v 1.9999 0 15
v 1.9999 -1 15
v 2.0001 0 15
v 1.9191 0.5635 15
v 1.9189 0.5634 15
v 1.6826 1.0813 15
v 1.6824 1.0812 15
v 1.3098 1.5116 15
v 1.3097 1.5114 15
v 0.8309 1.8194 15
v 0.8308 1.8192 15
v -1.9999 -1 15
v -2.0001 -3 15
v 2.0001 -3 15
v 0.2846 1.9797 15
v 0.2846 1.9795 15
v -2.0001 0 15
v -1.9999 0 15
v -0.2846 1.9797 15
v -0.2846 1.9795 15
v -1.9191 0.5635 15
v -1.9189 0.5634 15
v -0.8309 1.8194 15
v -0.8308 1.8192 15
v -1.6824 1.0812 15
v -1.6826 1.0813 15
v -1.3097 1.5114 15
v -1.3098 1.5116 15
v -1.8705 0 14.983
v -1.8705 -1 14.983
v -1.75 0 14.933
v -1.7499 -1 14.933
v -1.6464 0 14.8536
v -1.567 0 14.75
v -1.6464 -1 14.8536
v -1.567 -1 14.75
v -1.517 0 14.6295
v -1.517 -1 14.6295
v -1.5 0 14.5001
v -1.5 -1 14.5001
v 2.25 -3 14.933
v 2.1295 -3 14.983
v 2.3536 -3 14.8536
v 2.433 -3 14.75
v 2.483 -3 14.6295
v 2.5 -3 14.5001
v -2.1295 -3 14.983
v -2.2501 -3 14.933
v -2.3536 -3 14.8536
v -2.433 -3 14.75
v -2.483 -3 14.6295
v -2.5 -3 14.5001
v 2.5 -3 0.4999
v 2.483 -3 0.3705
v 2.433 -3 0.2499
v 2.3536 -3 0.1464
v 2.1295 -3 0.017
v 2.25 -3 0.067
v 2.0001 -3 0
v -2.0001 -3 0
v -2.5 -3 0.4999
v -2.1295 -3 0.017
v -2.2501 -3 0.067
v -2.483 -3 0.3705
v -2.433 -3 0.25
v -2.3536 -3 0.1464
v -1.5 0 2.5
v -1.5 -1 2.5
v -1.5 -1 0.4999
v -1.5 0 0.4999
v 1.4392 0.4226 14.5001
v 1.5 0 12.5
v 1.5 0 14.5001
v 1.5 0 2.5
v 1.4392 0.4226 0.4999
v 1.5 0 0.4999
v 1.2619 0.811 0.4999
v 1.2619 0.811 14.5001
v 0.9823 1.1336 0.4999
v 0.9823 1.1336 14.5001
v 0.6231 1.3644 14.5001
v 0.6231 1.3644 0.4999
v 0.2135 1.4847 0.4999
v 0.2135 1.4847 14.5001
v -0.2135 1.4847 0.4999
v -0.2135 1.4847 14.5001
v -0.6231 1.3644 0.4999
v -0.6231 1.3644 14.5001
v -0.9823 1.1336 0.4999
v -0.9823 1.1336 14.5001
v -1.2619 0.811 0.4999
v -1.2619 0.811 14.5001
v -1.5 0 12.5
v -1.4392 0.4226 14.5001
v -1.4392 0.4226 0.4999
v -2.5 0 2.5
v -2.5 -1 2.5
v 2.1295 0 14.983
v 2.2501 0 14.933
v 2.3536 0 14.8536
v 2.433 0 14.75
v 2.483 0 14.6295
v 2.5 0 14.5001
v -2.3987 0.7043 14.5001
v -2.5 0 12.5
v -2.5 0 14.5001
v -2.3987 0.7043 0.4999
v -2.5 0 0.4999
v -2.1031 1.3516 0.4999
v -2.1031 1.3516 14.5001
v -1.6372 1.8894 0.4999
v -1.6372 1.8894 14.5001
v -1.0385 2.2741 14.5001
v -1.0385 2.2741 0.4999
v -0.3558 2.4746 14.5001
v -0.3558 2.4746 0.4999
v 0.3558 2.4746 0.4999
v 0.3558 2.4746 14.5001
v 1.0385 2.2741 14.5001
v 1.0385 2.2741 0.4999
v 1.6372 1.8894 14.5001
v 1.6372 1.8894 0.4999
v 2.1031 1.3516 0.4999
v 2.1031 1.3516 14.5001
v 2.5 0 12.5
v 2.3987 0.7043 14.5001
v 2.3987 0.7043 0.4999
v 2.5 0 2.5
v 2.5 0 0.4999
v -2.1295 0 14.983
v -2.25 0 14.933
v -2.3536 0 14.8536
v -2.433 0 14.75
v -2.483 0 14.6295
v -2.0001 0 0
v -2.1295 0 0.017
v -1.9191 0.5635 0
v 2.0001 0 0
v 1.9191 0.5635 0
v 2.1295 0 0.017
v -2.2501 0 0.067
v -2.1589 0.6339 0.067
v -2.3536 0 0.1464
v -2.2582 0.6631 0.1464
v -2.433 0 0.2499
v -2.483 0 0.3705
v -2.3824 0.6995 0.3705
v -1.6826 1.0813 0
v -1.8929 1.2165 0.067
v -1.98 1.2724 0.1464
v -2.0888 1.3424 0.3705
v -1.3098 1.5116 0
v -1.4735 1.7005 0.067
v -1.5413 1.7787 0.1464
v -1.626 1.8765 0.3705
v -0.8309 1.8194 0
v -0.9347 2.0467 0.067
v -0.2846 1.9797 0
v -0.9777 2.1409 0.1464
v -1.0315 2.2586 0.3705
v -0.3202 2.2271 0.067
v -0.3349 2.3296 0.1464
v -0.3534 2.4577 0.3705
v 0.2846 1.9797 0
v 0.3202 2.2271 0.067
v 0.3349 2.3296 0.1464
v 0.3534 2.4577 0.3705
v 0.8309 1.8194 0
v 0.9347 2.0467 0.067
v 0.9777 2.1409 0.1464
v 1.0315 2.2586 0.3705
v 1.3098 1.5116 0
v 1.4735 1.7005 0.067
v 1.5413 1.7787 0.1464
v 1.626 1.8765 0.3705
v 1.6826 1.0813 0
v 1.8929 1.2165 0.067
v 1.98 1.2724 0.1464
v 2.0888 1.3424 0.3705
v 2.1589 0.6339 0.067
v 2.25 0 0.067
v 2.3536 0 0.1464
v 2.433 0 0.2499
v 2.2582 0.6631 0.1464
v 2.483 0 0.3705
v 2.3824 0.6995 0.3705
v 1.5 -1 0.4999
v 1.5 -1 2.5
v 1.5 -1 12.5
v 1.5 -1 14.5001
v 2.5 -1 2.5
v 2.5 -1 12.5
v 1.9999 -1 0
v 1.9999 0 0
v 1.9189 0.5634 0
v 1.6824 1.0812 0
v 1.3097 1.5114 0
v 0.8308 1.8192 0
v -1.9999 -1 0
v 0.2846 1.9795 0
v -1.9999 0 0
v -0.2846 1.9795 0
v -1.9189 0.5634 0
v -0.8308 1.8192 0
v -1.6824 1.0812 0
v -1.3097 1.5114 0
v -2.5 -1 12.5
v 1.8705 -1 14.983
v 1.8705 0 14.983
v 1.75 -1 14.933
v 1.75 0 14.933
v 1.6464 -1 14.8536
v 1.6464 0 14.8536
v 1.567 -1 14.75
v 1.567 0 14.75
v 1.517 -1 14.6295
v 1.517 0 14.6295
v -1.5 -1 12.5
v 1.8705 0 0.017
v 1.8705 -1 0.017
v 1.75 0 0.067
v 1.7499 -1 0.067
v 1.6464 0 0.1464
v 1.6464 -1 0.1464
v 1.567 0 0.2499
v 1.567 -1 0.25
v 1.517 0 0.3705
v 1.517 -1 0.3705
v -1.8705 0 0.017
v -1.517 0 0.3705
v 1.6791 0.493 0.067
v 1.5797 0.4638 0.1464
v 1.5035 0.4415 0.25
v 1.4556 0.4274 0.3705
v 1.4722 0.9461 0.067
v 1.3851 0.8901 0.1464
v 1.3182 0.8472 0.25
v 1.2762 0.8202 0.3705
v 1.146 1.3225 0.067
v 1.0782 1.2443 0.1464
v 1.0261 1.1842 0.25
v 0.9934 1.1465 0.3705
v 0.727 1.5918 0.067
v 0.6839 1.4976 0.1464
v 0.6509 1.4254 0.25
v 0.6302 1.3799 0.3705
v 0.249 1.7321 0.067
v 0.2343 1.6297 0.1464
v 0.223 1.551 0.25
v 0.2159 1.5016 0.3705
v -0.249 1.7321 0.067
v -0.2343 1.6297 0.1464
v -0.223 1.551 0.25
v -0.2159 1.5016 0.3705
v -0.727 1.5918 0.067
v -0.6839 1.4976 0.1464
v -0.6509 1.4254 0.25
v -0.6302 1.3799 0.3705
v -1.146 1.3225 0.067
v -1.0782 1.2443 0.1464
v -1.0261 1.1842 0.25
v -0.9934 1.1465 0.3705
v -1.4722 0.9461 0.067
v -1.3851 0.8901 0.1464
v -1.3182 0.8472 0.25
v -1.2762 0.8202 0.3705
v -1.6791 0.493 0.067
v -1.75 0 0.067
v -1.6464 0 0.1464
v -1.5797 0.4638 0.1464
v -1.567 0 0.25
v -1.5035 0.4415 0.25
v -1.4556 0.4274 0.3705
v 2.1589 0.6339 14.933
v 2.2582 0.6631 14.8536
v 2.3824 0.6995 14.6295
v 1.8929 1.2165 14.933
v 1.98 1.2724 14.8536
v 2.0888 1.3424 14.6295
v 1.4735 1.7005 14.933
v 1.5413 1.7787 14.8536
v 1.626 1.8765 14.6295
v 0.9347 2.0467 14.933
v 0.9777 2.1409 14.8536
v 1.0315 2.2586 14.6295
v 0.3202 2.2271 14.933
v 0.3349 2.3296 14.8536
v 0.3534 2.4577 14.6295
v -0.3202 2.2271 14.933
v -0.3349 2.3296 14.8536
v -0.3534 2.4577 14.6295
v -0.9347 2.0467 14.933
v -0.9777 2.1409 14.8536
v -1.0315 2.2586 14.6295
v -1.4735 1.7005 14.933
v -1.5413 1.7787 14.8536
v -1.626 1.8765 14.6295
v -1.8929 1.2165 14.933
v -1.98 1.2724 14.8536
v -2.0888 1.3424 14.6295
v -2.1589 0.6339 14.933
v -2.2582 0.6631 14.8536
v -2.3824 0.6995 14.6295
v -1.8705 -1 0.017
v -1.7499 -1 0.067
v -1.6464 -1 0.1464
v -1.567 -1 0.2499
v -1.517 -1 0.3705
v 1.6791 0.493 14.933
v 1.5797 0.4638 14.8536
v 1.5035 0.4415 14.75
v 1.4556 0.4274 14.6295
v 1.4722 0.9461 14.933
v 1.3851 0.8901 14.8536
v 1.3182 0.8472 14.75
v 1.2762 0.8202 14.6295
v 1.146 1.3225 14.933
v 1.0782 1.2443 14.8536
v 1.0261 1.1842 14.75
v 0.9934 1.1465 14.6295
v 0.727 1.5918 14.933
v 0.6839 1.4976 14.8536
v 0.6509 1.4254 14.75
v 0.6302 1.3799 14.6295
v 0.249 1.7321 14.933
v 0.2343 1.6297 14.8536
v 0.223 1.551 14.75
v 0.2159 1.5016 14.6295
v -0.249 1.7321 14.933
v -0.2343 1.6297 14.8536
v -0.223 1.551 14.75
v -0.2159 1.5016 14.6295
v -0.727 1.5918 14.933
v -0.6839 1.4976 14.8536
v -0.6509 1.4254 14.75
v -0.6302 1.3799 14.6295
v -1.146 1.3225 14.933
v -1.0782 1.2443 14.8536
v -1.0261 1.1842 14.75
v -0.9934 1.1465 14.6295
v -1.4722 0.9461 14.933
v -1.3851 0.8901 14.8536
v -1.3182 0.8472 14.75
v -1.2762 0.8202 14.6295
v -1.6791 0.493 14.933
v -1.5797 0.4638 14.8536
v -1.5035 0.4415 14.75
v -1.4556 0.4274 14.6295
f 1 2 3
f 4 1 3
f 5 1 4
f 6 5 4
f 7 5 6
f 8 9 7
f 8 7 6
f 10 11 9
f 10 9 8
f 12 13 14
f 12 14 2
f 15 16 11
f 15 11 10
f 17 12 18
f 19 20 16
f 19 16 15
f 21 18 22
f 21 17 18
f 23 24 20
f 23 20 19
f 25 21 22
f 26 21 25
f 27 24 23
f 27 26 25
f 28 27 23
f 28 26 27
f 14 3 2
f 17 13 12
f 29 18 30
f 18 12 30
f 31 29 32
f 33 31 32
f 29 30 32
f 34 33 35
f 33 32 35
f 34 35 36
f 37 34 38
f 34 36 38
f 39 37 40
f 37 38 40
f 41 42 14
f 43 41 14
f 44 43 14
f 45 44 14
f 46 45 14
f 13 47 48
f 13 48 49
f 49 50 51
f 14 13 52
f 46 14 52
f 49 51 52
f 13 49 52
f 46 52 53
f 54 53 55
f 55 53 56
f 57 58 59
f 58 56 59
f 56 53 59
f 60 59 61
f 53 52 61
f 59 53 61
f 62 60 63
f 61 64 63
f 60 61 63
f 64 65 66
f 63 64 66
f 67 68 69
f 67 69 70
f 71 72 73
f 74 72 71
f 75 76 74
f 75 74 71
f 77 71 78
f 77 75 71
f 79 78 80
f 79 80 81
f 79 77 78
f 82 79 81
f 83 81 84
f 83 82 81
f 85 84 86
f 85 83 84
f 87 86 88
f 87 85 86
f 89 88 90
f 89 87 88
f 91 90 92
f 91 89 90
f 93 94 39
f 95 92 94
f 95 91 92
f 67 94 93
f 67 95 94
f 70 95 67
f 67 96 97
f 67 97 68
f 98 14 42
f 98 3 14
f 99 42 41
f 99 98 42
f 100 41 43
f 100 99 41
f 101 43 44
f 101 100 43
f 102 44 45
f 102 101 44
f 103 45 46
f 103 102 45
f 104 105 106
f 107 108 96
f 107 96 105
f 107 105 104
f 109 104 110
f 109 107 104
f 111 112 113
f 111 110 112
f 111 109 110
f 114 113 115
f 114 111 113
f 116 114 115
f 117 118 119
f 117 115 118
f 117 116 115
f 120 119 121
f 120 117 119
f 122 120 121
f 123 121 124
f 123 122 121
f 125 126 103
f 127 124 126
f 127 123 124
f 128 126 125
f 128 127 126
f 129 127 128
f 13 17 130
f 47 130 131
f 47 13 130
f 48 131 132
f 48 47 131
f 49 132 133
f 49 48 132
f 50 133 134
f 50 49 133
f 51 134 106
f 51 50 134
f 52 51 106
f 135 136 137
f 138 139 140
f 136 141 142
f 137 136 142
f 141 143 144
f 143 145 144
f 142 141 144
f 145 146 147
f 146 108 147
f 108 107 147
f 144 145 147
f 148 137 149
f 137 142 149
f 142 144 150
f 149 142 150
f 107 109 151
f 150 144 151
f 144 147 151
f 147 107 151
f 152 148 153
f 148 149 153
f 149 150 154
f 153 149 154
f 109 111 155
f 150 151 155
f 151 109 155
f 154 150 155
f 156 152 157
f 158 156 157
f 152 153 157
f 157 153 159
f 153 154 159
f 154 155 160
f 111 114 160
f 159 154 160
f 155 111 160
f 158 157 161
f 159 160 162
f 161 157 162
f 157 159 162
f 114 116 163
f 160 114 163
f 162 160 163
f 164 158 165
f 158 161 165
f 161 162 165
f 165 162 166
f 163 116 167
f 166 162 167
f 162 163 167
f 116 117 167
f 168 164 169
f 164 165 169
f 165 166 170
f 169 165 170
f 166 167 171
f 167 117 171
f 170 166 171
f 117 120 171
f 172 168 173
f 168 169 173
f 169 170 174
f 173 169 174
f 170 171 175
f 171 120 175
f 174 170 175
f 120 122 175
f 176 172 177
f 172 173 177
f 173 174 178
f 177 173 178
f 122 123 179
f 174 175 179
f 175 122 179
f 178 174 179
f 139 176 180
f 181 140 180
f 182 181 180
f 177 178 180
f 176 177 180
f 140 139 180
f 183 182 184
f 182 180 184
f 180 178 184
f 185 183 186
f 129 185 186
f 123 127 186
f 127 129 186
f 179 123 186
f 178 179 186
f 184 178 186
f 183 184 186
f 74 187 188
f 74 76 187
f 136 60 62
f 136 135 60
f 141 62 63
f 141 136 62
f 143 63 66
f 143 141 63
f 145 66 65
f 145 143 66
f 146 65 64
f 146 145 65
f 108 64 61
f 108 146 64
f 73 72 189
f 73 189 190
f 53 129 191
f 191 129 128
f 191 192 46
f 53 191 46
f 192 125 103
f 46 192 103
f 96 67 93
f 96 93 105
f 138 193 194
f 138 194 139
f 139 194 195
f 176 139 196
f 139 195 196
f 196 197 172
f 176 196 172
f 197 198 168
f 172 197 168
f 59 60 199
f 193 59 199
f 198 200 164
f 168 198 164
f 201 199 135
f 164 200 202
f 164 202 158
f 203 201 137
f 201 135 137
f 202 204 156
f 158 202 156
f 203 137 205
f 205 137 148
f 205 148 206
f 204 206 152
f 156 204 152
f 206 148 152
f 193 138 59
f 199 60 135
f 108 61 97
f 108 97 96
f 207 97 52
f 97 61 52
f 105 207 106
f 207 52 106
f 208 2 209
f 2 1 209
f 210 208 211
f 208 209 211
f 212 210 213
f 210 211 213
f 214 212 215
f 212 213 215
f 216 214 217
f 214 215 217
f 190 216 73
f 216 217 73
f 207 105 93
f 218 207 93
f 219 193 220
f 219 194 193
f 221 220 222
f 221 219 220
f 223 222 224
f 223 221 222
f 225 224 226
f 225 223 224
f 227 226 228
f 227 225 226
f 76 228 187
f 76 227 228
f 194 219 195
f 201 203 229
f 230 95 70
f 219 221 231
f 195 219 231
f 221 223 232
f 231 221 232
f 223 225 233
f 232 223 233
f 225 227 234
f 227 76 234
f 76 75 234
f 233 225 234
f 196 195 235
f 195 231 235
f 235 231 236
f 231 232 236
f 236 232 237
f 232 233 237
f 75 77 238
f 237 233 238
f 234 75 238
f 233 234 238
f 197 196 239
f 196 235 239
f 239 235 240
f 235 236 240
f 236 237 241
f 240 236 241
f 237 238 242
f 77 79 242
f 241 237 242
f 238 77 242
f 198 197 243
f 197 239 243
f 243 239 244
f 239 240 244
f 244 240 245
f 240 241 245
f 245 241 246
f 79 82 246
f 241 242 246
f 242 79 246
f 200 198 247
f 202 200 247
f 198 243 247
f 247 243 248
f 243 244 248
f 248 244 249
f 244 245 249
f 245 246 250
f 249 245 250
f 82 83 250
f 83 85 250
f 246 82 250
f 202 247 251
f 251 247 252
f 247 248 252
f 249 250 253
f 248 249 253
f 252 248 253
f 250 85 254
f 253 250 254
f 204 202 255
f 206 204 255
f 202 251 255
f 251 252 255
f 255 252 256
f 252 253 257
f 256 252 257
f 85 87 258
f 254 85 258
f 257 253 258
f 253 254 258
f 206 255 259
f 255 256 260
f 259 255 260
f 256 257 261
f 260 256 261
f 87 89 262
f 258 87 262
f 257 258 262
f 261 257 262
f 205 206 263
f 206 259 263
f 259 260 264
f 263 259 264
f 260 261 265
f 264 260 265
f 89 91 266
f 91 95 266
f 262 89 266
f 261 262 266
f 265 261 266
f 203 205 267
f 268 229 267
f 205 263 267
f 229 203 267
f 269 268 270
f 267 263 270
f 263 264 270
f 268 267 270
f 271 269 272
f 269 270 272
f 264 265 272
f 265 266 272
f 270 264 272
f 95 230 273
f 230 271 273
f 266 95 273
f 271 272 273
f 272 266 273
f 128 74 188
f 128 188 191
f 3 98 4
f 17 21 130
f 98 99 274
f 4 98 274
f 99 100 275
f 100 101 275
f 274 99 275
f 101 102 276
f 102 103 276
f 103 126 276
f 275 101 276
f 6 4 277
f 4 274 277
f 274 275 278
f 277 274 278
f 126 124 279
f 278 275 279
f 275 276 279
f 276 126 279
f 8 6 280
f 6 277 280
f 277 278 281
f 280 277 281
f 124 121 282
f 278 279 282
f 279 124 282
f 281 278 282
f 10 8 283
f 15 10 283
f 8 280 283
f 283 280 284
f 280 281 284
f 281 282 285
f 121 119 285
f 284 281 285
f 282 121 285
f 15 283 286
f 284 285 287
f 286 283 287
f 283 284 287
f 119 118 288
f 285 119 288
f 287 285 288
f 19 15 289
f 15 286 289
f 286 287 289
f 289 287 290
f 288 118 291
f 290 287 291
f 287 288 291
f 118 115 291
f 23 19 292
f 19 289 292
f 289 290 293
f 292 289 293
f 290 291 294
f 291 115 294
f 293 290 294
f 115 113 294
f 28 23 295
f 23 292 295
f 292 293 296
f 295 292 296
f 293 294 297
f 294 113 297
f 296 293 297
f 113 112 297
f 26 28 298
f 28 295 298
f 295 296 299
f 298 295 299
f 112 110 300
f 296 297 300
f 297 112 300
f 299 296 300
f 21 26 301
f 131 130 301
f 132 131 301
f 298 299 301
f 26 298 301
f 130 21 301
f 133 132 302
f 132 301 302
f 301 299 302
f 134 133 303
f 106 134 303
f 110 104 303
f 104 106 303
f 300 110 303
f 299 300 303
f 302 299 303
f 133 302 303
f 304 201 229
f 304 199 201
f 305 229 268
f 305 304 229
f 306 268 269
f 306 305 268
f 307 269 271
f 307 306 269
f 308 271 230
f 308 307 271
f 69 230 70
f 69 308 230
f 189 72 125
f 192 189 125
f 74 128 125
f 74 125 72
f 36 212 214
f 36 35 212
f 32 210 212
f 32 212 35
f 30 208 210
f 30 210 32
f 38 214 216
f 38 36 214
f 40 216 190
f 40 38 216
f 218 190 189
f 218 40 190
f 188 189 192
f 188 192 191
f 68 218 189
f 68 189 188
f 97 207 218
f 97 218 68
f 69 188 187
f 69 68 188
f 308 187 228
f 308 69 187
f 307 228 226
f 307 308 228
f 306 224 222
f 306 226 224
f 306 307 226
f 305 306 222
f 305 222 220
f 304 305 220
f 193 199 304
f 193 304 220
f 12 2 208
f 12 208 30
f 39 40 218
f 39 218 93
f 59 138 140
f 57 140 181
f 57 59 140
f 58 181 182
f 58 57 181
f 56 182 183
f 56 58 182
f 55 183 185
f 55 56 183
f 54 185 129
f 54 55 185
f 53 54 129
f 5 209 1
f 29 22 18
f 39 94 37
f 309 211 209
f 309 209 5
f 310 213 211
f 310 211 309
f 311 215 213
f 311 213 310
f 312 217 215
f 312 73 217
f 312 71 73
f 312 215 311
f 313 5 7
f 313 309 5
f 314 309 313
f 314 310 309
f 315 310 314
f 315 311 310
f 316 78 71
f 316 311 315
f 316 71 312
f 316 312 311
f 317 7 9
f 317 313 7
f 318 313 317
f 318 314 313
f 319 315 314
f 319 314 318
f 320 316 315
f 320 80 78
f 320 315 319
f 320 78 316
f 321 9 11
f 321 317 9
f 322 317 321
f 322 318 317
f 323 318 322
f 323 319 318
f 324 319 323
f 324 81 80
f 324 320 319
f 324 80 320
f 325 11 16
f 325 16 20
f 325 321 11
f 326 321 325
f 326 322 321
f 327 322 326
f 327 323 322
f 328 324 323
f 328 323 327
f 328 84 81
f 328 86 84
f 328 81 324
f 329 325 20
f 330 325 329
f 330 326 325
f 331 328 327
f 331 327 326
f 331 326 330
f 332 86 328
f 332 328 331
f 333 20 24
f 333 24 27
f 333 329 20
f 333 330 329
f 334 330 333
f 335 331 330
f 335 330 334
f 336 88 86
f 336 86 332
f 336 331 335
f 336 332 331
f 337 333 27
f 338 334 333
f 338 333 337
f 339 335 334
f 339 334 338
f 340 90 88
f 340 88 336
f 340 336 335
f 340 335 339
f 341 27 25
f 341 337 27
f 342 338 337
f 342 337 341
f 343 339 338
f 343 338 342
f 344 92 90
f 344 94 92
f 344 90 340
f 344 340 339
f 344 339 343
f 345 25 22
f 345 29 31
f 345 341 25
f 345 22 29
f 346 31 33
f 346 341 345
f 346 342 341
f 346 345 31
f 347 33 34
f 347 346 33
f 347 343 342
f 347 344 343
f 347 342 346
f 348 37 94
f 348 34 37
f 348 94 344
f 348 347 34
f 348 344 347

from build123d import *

# Parameters (mm, degrees)
DODANIE_WYCI_GNI_CIE2_DEPTH = 15
SZKIC3_W                    = 1
SZKIC3_H                    = 2.5
DODANIE_WYCI_GNI_CIE3_DEPTH = 3
SZKIC4_W                    = 1
SZKIC4_H                    = 2
DODANIE_WYCI_GNI_CIE4_DEPTH = 10
SZKIC6_W                    = 15
SZKIC6_H                    = 2
DODANIE_WYCI_GNI_CIE5_DEPTH = 3
ZAOKR_GLENIE1_R             = 0.5


with BuildPart() as part:
    # Szkic1 → Dodanie-wyciągnięcie2 (new body)
    with BuildSketch(Plane.XY):
        with BuildLine():
            ThreePointArc((-2.5, 0), (0, 2.5), (2.5, 0))
            Line((2.5, 0), (1.5, 0))
            ThreePointArc((1.5, 0), (0, 1.5), (-1.5, 0))
            Line((-1.5, 0), (-2.5, 0))
        make_face()
    extrude(amount=DODANIE_WYCI_GNI_CIE2_DEPTH)

    # Szkic3 → Dodanie-wyciągnięcie3 (add)
    with BuildSketch(Plane.XZ):
        with Locations((-2, 13.75)):
            Rectangle(SZKIC3_W, SZKIC3_H)
        with Locations((2, 13.75)):
            Rectangle(SZKIC3_W, SZKIC3_H)
        with Locations((2, 1.25)):
            Rectangle(SZKIC3_W, SZKIC3_H)
        with Locations((-2, 1.25)):
            Rectangle(SZKIC3_W, SZKIC3_H)
    extrude(amount=DODANIE_WYCI_GNI_CIE3_DEPTH)

    # Szkic4 → Dodanie-wyciągnięcie4 (add)
    with BuildSketch(Plane(origin=(0, 0, 12.5), x_dir=(-1, 0, 0), z_dir=(0, 0, -1))):
        with Locations((2, -2)):
            Rectangle(SZKIC4_W, SZKIC4_H)
        with Locations((-2, -2)):
            Rectangle(SZKIC4_W, SZKIC4_H)
    extrude(amount=DODANIE_WYCI_GNI_CIE4_DEPTH)

    # Szkic6 → Dodanie-wyciągnięcie5 (add)
    with BuildSketch(Plane(origin=(-1.5, 0, 0), x_dir=(0, 0, -1), z_dir=(1, 0, 0))):
        with Locations((-7.5, -2)):
            Rectangle(SZKIC6_W, SZKIC6_H)
    extrude(amount=DODANIE_WYCI_GNI_CIE5_DEPTH)

    # Zaokrąglenie1
    zaokr_glenie1_edges = [part.edges().sort_by_distance(p)[0] for p in [
        (0, 1.5, 15),
        (-2.5, -1.5, 15),
        (2.5, -1.5, 15),
        (2.5, -1.5, 0),
        (-2.5, -1.5, 0),
        (0, 2.5, 15),
        (0, 1.5, 0),
        (0, 2.5, 0),
        (1.5, -0.5, 0),
        (1.5, -0.5, 15),
        (-1.5, -0.5, 15),
        (-1.5, -0.5, 0),
    ]]
    fillet(zaokr_glenie1_edges, radius=ZAOKR_GLENIE1_R - 0.0001)  # a hair under: the kernel refuses the full size


solid = part.part
